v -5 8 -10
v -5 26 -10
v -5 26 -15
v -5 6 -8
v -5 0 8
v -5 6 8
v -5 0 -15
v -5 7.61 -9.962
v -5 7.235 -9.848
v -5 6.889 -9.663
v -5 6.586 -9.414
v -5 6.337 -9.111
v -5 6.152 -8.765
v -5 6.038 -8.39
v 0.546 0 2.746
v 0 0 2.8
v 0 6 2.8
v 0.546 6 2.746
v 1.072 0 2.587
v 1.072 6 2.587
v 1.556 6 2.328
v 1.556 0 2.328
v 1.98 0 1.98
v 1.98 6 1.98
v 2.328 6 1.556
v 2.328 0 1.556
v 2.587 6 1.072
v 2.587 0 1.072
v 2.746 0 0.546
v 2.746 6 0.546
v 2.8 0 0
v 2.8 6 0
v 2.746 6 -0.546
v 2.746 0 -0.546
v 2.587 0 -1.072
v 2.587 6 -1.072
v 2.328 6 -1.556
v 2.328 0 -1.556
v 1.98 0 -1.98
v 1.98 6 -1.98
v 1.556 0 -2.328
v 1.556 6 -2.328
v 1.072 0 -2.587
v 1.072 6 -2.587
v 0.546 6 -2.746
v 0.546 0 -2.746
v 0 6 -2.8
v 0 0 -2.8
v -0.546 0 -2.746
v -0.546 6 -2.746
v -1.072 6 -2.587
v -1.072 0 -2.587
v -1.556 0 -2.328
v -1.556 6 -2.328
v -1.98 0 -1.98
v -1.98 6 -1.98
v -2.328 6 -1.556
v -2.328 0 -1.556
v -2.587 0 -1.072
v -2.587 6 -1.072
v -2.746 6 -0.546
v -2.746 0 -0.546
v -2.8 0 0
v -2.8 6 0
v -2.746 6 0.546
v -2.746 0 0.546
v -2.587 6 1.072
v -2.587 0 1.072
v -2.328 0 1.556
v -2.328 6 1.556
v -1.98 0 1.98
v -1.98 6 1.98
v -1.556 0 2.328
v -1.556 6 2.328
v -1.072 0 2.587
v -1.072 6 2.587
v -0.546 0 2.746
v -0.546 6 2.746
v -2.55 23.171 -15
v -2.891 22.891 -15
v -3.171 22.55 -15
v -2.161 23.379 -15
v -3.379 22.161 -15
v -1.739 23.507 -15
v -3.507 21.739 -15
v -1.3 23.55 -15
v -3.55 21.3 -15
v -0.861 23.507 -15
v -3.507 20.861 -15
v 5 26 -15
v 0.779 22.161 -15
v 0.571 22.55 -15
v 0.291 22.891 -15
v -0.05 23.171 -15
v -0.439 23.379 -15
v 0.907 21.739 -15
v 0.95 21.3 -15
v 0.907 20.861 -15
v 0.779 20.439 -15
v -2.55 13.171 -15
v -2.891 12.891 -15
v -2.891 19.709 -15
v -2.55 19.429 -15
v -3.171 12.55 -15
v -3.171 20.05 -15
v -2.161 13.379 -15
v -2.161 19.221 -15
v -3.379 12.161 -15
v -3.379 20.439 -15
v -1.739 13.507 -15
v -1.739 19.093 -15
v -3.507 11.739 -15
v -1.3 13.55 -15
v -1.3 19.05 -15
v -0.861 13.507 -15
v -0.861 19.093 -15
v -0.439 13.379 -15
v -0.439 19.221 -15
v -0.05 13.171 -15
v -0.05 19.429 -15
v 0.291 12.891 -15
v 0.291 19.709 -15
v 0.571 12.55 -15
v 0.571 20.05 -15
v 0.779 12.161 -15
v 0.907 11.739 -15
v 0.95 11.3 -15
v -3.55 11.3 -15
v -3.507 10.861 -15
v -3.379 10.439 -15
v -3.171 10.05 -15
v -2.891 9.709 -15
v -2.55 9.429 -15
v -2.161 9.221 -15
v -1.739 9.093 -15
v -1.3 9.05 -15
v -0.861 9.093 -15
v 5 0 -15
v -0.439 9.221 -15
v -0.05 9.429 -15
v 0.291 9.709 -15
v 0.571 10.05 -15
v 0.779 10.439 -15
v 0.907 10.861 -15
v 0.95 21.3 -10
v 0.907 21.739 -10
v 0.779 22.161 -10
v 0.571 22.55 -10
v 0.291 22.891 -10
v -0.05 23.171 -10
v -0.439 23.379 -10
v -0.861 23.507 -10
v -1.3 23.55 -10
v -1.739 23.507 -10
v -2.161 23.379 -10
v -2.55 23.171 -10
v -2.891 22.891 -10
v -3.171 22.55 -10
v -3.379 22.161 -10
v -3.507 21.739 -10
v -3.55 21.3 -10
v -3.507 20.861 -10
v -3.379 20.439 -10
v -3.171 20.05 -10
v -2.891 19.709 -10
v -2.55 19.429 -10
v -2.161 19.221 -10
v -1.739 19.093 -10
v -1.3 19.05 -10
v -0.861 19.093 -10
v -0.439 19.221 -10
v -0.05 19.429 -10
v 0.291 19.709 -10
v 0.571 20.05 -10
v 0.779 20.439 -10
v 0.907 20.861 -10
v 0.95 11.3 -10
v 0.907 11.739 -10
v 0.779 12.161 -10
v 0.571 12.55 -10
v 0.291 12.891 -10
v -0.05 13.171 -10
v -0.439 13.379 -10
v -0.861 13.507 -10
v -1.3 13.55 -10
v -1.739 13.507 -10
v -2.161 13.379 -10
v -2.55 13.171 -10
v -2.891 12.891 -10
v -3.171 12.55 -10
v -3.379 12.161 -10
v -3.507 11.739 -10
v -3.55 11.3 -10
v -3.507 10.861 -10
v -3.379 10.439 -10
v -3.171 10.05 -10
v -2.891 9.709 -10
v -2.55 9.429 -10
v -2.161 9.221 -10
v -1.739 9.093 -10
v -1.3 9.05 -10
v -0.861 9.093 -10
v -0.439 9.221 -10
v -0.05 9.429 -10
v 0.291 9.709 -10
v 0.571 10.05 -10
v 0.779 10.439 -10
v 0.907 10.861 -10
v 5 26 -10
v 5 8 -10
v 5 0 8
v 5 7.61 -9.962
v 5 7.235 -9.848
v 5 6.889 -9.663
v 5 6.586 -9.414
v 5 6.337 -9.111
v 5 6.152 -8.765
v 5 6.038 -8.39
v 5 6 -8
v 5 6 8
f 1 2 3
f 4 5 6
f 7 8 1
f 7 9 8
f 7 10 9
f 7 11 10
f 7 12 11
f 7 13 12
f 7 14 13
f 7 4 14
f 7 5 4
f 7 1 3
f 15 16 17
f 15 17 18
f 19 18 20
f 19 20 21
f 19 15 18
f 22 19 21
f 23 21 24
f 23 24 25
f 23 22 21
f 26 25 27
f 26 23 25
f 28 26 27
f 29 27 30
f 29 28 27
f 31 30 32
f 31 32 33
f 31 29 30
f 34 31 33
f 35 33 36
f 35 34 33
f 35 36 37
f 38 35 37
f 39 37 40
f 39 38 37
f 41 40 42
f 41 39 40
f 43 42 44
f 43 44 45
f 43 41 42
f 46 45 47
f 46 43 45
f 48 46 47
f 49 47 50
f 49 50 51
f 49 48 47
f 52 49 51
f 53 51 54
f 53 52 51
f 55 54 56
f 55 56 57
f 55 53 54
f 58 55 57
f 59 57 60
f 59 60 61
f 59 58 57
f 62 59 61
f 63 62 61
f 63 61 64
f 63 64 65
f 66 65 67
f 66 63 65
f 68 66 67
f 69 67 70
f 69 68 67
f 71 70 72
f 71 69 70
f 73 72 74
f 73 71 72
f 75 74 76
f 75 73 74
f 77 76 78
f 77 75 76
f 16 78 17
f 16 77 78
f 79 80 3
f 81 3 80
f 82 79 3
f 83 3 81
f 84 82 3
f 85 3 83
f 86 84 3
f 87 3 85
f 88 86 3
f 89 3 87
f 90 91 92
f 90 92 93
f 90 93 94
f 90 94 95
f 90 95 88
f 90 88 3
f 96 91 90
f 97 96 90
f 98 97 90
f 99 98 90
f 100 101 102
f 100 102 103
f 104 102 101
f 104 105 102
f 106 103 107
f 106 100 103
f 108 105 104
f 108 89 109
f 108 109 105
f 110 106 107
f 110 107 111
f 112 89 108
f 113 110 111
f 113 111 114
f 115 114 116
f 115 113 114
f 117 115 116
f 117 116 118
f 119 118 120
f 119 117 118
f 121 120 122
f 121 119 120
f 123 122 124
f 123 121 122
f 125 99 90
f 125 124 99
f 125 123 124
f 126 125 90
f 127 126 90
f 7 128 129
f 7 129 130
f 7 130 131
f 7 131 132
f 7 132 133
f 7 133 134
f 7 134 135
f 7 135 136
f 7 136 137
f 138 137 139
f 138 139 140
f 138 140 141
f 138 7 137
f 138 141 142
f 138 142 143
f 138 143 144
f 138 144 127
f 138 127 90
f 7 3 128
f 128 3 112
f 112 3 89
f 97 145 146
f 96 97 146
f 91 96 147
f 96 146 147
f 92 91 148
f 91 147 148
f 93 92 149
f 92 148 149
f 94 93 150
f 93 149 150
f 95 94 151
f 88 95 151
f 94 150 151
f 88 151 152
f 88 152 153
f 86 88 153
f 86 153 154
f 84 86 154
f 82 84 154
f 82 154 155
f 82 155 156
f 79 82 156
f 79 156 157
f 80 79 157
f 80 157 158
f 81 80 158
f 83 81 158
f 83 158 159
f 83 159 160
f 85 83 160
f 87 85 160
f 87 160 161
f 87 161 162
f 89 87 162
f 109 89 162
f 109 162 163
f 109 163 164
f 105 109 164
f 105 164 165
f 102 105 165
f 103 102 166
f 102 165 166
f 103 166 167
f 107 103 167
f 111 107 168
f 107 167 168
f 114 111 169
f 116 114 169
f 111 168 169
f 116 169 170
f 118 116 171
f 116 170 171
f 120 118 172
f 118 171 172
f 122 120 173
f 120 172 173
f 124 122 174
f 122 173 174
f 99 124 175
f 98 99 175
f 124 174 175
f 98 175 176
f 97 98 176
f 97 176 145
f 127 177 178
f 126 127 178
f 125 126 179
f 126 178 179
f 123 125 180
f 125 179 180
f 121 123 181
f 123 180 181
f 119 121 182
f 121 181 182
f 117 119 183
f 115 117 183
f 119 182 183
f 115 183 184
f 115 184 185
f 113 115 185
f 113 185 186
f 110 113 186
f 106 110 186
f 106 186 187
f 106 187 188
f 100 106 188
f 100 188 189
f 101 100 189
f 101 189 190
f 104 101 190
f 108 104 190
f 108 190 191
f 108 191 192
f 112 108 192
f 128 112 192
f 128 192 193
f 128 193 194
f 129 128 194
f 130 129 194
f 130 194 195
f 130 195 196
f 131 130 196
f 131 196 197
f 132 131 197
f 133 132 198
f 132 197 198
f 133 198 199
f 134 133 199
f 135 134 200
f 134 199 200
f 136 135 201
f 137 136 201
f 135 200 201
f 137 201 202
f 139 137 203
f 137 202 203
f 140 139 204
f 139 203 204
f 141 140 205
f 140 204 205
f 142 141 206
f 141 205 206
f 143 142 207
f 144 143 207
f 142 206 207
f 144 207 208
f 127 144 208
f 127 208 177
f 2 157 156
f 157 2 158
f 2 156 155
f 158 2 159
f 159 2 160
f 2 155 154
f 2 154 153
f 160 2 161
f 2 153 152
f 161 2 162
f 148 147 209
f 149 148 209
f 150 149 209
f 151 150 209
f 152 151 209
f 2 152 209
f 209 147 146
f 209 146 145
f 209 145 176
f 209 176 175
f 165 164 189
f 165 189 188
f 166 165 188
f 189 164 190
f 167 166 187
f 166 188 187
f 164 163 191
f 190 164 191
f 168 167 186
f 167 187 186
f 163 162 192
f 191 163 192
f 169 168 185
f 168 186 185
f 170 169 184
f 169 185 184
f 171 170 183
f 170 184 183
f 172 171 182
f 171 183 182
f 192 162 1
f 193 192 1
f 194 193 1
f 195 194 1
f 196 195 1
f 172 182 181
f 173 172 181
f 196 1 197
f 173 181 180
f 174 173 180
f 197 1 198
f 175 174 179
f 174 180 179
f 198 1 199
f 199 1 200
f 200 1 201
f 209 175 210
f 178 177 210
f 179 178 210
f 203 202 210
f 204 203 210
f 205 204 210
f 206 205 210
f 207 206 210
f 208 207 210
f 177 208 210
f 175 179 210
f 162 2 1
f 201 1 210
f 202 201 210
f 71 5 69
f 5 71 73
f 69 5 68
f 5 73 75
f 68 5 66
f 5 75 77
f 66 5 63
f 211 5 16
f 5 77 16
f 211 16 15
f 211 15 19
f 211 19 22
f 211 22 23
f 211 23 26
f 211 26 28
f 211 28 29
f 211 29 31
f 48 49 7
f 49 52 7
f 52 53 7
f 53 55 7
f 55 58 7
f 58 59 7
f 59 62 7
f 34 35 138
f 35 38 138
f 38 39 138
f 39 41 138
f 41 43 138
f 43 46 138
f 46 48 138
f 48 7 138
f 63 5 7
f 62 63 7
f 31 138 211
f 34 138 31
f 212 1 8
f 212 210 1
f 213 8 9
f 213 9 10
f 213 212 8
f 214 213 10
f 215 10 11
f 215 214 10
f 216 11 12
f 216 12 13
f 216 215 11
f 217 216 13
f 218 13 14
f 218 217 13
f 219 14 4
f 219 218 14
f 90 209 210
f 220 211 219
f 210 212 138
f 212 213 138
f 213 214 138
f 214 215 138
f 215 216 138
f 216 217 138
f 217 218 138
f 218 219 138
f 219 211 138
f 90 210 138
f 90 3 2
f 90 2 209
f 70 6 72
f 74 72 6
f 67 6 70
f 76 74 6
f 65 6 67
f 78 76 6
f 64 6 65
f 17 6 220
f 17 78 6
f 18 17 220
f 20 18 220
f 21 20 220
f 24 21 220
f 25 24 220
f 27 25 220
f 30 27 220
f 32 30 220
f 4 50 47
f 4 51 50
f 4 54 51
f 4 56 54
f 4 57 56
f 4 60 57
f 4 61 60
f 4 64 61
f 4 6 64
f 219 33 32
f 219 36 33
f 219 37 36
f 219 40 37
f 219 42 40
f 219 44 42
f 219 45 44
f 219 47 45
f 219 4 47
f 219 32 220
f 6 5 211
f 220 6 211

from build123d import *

# Parameters (mm, degrees)
SKETCH1_W           = 10
SKETCH1_H           = 23
SKETCH1_R           = 2.8
BOSS_EXTRUDE1_DEPTH = 6
SKETCH2_W           = 10
SKETCH2_H           = 5
BOSS_EXTRUDE2_DEPTH = 20
SKETCH4_R           = 2.25
CUT_EXTRUDE1_DEPTH  = 10
FILLET1_R           = 2


with BuildPart() as part:
    # Sketch1 → Boss-Extrude1 (new body)
    with BuildSketch(Plane(origin=(0, 0, 0), x_dir=(1, 0, 0), z_dir=(0, 1, 0))):
        with Locations((0, 3.5)):
            Rectangle(SKETCH1_W, SKETCH1_H)
        with Locations(Location((0, 0, 0), (0, 0, 270))):
            Circle(SKETCH1_R, mode=Mode.SUBTRACT)
    extrude(amount=BOSS_EXTRUDE1_DEPTH)

    # Sketch2 → Boss-Extrude2 (add)
    with BuildSketch(Plane(origin=(0, 6, 0), x_dir=(1, 0, 0), z_dir=(0, 1, 0))):
        with Locations((0, 12.5)):
            Rectangle(SKETCH2_W, SKETCH2_H)
    extrude(amount=BOSS_EXTRUDE2_DEPTH)

    # Sketch4 → Cut-Extrude1 (cut)
    with BuildSketch(Plane.XY.offset(-10)):
        with Locations((-1.3, 11.3)):
            Circle(SKETCH4_R)
        with Locations((-1.3, 21.3)):
            Circle(SKETCH4_R)
    extrude(amount=-CUT_EXTRUDE1_DEPTH, mode=Mode.SUBTRACT)

    # Fillet1
    fillet1_edges = [part.edges().sort_by_distance(p)[0] for p in [
        (0, 6, -10),
    ]]
    fillet(fillet1_edges, radius=FILLET1_R)


solid = part.part
